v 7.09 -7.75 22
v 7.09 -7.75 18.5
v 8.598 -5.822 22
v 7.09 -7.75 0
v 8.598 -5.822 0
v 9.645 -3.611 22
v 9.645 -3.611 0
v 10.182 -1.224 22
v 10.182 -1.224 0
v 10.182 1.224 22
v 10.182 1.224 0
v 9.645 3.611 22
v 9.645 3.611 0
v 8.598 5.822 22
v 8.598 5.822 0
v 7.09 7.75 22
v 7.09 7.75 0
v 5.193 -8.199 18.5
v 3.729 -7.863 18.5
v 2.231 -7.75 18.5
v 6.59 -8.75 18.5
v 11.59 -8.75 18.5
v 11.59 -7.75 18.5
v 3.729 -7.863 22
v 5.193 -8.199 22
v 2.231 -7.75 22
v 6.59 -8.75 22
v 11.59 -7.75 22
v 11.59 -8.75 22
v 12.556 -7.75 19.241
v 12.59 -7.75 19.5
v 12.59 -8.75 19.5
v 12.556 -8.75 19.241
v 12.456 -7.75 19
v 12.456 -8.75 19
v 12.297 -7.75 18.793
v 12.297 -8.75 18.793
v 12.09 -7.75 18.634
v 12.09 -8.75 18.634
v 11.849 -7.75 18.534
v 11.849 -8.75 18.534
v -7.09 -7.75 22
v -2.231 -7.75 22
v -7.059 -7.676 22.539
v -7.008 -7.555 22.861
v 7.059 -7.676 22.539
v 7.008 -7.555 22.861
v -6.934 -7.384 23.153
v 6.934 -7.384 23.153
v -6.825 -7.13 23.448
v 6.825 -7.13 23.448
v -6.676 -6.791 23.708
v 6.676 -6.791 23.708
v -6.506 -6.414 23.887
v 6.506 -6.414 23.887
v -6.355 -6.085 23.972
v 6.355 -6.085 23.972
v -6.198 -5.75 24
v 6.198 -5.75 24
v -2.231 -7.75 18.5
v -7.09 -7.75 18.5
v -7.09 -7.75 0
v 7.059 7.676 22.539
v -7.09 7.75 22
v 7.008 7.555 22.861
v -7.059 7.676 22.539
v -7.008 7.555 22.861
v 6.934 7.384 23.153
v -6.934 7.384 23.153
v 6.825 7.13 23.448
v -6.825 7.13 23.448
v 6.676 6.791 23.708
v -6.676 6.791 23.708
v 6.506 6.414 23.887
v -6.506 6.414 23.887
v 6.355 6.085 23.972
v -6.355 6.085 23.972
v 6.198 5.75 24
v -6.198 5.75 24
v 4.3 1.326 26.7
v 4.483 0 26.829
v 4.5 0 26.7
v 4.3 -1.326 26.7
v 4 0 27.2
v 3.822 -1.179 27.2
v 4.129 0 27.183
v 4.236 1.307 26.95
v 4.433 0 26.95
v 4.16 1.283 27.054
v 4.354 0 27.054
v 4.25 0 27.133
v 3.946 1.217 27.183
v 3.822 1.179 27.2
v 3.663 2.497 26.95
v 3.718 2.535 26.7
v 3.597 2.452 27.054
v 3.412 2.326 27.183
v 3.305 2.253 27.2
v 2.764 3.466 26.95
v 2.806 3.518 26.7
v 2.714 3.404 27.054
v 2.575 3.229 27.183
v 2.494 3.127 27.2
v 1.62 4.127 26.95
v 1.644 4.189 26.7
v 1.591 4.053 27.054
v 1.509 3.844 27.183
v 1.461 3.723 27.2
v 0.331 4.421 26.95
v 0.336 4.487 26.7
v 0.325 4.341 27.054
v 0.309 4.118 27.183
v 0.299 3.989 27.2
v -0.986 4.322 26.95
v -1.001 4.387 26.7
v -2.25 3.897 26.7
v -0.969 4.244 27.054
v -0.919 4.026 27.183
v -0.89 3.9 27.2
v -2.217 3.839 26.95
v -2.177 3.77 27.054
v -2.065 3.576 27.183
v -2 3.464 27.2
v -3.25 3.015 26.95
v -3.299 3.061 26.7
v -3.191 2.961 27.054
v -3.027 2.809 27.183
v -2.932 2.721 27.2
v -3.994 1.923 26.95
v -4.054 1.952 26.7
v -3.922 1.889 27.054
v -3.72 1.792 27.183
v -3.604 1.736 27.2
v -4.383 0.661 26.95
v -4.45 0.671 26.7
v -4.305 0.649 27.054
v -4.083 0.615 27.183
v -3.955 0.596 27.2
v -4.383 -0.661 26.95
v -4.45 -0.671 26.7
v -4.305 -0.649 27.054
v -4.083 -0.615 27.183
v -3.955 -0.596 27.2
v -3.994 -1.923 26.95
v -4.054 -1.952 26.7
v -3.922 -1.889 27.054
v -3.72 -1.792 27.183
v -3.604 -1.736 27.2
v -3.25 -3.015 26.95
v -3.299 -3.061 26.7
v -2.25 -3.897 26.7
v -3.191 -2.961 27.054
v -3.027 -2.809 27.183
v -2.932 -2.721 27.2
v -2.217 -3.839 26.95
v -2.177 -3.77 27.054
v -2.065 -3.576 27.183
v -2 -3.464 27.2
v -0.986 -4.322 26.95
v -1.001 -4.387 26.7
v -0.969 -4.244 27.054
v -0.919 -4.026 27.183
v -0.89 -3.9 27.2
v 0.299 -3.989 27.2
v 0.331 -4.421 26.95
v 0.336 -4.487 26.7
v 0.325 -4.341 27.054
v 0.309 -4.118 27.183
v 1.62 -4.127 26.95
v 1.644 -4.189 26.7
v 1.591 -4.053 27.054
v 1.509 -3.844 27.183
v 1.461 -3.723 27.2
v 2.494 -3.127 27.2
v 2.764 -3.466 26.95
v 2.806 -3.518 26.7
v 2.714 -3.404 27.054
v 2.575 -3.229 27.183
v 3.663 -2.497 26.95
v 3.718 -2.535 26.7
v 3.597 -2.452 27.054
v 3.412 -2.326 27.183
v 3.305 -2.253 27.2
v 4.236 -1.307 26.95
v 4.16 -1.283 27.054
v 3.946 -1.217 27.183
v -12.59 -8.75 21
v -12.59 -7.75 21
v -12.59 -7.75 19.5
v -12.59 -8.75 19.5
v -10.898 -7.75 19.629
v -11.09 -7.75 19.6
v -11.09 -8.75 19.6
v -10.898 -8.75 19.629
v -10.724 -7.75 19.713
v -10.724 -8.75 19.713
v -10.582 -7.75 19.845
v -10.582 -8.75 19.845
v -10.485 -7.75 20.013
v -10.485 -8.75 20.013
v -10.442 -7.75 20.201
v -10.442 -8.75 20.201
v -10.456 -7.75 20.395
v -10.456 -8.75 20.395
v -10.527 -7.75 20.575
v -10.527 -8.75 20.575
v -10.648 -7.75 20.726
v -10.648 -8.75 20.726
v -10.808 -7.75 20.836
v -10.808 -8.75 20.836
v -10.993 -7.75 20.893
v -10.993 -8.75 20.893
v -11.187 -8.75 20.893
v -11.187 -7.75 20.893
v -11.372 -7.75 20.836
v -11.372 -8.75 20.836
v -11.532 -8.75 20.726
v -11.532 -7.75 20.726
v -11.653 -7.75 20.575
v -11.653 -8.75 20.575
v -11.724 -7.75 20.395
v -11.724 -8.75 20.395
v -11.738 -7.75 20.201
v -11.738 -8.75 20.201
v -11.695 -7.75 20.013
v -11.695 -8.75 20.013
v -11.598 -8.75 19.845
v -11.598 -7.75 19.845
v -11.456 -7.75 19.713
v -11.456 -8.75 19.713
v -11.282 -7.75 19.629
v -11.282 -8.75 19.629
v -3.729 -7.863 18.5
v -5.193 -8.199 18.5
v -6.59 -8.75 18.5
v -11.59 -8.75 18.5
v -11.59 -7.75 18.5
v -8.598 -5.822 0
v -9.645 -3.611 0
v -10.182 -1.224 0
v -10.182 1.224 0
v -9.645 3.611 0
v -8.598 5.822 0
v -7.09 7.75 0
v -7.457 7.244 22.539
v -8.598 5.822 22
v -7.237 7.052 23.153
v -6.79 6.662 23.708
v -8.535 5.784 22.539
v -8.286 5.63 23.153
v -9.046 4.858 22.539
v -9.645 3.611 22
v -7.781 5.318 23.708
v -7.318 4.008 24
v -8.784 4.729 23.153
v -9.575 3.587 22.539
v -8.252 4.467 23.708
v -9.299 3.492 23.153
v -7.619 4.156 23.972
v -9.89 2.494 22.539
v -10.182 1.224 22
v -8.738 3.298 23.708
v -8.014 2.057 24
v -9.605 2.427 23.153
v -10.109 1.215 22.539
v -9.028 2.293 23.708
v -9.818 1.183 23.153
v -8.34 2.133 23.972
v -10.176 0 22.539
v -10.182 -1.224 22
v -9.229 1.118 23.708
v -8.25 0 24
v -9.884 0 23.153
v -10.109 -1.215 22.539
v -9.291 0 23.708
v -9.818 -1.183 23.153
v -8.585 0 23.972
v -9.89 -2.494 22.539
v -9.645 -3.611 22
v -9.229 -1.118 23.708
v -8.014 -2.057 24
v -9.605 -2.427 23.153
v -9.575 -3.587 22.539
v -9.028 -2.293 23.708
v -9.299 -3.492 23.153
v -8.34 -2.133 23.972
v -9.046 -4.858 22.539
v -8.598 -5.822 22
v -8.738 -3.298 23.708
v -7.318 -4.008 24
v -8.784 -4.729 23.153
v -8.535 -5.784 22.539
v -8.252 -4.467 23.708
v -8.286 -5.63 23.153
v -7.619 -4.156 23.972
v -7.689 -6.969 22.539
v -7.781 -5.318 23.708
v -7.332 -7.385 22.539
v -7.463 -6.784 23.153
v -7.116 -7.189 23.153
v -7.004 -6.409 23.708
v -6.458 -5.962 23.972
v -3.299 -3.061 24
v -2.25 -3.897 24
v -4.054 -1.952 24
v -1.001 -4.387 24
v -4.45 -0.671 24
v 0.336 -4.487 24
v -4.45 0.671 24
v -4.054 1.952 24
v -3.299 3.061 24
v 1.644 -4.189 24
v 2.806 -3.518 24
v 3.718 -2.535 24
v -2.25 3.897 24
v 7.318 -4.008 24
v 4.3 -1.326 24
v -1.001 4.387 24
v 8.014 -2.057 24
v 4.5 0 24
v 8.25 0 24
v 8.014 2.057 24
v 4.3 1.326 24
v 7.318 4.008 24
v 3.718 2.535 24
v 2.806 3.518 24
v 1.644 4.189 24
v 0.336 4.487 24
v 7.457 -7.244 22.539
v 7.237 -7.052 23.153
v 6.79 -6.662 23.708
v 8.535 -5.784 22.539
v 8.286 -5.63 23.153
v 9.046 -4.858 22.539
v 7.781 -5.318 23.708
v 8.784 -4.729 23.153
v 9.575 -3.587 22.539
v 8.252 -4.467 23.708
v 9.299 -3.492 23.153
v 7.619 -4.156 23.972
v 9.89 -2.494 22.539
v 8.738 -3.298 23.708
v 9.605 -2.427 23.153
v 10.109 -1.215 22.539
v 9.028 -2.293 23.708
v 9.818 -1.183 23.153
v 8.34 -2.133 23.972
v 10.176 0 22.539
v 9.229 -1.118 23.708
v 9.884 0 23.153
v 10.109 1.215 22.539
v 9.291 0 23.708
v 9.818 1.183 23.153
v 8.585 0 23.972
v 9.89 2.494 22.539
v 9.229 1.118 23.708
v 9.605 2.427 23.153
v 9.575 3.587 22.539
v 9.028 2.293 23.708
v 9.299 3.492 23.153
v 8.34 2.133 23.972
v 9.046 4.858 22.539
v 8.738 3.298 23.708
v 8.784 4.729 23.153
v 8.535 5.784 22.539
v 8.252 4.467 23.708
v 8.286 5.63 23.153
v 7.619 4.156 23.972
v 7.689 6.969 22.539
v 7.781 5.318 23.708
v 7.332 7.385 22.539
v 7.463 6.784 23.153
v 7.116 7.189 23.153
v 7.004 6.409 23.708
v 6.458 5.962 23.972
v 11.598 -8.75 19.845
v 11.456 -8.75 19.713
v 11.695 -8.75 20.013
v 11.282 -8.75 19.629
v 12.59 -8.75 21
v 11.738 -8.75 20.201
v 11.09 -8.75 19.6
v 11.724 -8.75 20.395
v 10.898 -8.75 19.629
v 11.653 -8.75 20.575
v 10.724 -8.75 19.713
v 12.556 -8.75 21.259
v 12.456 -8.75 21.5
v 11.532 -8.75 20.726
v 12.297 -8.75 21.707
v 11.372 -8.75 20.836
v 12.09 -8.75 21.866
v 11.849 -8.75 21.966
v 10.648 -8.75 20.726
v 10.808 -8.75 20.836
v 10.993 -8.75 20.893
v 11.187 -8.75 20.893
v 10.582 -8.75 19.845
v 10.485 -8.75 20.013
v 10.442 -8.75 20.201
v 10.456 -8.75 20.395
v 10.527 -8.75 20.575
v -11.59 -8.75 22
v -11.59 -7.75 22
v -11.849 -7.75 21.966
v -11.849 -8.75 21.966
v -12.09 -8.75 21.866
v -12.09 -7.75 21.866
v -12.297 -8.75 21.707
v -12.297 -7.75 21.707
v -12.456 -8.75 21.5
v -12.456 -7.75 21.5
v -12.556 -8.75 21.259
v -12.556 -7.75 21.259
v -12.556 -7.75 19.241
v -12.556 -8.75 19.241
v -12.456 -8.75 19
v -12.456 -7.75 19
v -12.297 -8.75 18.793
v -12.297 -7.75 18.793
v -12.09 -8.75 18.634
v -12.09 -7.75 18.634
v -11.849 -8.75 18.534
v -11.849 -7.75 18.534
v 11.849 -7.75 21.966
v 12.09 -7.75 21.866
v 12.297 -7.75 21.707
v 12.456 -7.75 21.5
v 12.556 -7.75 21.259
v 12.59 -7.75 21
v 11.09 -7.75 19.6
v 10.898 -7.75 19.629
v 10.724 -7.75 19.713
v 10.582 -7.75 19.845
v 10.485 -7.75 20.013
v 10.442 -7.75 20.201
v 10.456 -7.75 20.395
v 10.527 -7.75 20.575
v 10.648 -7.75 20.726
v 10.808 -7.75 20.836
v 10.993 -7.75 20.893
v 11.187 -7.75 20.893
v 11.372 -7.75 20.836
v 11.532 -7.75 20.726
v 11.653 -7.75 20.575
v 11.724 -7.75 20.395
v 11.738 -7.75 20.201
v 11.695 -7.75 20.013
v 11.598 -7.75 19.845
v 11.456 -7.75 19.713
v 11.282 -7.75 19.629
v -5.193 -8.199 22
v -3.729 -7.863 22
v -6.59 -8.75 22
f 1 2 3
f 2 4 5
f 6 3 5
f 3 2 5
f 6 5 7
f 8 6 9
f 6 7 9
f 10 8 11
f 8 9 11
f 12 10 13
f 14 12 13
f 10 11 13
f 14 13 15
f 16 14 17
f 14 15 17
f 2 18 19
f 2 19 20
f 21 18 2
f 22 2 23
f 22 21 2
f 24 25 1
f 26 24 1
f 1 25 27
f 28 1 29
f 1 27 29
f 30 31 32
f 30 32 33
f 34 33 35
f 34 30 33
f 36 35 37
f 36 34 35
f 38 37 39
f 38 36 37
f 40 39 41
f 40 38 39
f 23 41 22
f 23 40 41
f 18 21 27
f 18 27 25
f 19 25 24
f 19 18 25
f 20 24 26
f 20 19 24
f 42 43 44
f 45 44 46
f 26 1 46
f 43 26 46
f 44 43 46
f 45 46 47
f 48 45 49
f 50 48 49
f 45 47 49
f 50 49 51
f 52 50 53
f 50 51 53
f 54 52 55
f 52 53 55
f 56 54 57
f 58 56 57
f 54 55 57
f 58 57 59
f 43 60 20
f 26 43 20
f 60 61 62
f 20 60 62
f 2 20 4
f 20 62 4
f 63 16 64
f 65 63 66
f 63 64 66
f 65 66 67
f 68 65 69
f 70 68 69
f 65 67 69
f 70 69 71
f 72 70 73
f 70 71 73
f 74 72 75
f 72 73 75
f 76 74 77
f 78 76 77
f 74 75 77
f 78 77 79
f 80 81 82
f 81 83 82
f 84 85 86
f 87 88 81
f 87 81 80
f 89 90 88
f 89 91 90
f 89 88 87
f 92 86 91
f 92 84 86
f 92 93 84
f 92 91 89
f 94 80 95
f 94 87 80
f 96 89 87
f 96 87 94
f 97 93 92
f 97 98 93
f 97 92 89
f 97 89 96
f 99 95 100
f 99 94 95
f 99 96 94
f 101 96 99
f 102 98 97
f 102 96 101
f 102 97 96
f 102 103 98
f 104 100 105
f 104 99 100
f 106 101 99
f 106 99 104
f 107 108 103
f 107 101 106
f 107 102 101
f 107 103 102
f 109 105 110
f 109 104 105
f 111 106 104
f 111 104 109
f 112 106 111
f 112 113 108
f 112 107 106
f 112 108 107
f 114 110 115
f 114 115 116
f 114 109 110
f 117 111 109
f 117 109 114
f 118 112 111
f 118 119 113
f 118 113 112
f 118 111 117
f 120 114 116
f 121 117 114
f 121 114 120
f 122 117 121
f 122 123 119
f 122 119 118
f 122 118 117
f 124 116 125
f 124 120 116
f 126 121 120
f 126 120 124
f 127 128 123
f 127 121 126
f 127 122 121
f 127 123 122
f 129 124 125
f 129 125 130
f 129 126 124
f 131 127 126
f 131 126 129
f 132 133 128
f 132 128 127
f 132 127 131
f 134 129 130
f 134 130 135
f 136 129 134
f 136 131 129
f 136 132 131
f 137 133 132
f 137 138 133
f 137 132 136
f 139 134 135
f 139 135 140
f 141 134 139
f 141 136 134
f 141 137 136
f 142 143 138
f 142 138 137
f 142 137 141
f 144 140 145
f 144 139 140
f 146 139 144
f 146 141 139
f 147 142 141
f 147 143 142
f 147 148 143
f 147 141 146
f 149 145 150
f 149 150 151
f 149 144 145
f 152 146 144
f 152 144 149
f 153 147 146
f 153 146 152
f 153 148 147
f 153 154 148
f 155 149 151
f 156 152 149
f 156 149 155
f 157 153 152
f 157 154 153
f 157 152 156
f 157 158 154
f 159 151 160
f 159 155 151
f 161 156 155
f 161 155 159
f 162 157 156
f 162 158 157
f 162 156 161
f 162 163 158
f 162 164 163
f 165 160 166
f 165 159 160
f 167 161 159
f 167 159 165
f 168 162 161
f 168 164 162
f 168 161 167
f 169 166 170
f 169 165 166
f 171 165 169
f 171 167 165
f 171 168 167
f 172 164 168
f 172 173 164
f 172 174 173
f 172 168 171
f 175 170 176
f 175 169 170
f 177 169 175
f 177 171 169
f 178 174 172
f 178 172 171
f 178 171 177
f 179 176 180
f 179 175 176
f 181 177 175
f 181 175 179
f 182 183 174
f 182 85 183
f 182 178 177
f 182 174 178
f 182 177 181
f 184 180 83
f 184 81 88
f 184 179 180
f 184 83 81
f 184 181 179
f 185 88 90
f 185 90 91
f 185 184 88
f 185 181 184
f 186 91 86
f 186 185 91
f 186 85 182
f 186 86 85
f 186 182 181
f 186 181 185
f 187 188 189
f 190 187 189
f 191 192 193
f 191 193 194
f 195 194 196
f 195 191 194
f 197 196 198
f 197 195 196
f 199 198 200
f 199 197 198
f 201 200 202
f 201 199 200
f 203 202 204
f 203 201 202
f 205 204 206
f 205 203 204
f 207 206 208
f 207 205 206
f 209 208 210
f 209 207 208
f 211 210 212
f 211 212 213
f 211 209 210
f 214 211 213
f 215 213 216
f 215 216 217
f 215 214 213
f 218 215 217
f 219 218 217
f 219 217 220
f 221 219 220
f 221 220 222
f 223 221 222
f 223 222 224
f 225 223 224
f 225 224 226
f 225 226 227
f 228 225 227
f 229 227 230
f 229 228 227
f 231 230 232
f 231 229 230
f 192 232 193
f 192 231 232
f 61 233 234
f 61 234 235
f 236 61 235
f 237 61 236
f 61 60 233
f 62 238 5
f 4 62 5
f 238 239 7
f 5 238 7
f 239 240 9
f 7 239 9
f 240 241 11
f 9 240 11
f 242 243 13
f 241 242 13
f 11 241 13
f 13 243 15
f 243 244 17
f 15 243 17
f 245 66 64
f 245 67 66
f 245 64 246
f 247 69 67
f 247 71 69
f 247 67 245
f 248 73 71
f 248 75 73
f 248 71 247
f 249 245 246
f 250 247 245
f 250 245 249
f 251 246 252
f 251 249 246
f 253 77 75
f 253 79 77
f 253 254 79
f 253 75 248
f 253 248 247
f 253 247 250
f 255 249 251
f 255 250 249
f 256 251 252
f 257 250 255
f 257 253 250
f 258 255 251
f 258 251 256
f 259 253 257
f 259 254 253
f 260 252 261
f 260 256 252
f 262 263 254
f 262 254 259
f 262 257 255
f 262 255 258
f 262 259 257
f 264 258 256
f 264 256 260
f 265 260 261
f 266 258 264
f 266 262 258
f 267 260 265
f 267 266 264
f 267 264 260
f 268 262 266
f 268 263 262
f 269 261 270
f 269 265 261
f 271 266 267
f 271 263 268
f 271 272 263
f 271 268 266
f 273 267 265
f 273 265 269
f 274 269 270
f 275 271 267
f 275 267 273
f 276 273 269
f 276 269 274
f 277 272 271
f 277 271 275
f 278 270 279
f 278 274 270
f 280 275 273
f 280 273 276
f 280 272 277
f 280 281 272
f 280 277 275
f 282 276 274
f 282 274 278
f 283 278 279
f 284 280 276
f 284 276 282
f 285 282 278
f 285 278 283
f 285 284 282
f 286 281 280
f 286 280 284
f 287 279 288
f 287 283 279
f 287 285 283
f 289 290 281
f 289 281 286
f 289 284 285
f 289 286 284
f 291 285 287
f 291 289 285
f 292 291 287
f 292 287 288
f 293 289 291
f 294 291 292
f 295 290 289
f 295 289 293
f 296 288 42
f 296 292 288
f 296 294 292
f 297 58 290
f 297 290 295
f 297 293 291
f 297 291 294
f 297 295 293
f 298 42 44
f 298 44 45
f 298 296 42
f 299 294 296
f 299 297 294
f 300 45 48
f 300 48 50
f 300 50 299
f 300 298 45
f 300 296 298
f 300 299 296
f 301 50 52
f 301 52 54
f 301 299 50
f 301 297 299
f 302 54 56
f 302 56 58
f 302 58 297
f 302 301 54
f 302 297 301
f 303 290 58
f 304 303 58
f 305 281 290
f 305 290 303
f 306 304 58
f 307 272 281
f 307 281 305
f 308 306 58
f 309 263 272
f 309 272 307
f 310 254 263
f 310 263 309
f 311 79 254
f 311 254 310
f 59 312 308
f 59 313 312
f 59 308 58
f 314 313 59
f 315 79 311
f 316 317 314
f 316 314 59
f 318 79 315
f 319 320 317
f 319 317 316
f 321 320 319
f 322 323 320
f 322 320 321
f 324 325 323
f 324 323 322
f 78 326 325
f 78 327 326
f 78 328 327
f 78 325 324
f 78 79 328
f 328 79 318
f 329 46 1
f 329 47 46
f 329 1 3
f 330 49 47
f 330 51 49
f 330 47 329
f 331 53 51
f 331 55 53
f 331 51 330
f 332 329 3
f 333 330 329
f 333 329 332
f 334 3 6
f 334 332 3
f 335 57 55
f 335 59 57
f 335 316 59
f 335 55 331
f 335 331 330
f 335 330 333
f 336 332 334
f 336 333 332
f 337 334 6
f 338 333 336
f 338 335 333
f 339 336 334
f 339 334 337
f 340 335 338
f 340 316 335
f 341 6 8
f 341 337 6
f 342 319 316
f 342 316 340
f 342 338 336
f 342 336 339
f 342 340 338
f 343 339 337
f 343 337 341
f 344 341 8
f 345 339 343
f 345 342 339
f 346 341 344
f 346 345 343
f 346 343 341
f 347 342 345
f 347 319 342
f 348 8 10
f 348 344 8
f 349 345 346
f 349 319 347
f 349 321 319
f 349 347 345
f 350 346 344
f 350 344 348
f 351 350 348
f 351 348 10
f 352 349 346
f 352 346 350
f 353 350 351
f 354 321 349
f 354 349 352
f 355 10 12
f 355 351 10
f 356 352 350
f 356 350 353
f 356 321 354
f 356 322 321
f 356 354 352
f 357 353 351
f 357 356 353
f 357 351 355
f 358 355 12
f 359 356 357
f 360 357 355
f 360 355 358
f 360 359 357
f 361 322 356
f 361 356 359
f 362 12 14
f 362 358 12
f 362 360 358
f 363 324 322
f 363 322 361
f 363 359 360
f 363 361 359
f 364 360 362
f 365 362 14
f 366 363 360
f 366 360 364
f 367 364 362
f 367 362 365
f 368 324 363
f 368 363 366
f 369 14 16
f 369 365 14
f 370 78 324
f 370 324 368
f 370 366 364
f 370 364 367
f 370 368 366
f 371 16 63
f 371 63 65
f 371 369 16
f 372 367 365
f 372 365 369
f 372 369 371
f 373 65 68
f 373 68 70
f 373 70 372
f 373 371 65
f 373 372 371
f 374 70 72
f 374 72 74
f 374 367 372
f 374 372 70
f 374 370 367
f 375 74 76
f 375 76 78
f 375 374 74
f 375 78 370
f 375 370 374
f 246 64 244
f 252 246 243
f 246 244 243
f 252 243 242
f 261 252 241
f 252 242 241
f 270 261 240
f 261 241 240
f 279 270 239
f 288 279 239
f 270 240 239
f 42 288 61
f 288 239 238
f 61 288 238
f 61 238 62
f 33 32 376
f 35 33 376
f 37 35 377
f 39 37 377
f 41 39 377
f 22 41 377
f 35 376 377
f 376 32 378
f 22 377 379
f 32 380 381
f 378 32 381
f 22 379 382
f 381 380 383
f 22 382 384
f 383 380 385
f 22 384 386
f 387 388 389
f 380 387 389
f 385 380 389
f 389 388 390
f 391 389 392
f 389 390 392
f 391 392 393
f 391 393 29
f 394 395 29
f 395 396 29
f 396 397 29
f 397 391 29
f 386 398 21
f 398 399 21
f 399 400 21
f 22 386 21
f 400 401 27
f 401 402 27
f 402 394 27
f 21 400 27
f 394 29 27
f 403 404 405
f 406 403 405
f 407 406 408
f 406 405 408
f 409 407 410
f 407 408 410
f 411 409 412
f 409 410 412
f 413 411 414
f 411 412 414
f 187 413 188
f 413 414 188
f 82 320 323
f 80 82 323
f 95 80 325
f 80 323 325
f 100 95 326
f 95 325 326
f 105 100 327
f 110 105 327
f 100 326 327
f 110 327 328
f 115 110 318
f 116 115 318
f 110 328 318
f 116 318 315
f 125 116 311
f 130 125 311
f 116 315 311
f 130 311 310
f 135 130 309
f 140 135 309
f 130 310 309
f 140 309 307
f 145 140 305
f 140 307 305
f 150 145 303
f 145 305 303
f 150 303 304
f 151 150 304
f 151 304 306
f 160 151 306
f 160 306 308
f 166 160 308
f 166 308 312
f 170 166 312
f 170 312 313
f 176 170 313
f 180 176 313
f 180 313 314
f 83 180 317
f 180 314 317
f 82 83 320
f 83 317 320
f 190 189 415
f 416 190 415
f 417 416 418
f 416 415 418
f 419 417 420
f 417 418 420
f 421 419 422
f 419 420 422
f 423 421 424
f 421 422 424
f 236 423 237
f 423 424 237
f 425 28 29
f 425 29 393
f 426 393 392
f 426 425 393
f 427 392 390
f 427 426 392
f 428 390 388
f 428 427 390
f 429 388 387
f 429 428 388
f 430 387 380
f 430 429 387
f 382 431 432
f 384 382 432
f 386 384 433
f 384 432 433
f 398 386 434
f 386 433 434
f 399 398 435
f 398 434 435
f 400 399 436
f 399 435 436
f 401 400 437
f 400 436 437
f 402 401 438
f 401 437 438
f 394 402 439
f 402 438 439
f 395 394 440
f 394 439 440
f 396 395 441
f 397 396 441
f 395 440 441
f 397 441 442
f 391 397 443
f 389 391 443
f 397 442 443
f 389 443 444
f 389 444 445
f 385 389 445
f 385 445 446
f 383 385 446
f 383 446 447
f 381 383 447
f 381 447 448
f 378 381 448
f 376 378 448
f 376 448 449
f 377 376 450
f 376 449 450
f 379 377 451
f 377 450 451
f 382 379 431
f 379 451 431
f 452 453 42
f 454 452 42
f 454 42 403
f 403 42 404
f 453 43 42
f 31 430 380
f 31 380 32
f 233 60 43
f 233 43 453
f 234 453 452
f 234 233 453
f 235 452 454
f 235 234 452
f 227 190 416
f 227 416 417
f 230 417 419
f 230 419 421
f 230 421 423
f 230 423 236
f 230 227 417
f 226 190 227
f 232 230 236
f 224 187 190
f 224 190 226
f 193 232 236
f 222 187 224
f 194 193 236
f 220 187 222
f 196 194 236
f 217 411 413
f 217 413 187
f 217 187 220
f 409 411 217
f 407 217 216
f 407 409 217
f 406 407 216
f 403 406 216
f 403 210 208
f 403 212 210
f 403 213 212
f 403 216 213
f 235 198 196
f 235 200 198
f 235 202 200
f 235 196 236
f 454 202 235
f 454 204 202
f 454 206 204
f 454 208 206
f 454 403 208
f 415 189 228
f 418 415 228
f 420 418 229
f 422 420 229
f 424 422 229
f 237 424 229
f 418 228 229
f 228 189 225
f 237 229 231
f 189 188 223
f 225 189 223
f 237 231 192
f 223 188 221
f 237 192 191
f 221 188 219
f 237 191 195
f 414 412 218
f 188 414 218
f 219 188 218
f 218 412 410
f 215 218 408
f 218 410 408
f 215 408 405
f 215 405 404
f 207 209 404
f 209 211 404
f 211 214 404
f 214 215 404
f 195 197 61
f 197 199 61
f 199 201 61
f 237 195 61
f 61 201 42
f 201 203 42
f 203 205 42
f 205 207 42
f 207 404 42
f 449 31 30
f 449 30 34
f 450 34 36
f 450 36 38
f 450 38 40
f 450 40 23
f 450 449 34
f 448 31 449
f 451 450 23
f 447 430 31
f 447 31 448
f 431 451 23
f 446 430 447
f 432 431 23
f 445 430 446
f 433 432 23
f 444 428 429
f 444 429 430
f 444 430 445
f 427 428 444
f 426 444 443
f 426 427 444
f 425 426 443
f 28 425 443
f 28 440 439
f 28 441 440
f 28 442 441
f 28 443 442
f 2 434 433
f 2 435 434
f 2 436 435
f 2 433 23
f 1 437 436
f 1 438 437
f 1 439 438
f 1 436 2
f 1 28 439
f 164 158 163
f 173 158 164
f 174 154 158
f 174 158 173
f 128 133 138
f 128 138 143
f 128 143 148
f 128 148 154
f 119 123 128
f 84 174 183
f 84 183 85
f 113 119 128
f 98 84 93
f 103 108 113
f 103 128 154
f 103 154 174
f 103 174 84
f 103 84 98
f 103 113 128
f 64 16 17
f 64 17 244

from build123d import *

# Parameters (mm, degrees)
SALIENTE_EXTRUIR1_DEPTH  = 24
REDONDEO1_R              = 2
CROQUIS2_R               = 4.5
SALIENTE_EXTRUIR2_DEPTH  = 3.2
REDONDEO2_R              = 0.5
CROQUIS3_R               = 0.65
SALIENTE_EXTRUIR3_DEPTH  = 1
REDONDEO3_R              = 10
REDONDEO3_OF_SIMETR_A1_R = 10


with BuildPart() as part:
    # Croquis1 → Saliente-Extruir1 (new body)
    with BuildSketch(Plane.XY):
        with BuildLine():
            Line((7.09, 7.75), (-7.09, 7.75))
            ThreePointArc((-7.09, 7.75), (-10.25, 0), (-7.09, -7.75))
            Line((-7.09, -7.75), (7.09, -7.75))
            ThreePointArc((7.09, -7.75), (10.25, 0), (7.09, 7.75))
        make_face()
    extrude(amount=SALIENTE_EXTRUIR1_DEPTH)

    # Redondeo1
    redondeo1_edges = [part.edges().sort_by_distance(p)[0] for p in [
        (10.25, 0, 24),
        (0, 7.75, 24),
        (-10.25, 0, 24),
        (0, -7.75, 24),
    ]]
    fillet(redondeo1_edges, radius=REDONDEO1_R)

    # Croquis2 → Saliente-Extruir2 (add)
    with BuildSketch(Plane.XY.offset(24)):
        Circle(CROQUIS2_R)
    extrude(amount=SALIENTE_EXTRUIR2_DEPTH)

    # Redondeo2
    redondeo2_edges = [part.edges().sort_by_distance(p)[0] for p in [
        (-4.5, 0, 27.2),
    ]]
    fillet(redondeo2_edges, radius=REDONDEO2_R)

    # Croquis3 → Saliente-Extruir3 (add)
    with BuildSketch(Plane.XZ.offset(7.75)):
        with BuildLine():
            Line((-6.59, 22), (-11.59, 22))
            ThreePointArc((-11.59, 22), (-12.297106781, 21.707106781), (-12.59, 21))
            Line((-12.59, 21), (-12.59, 19.5))
            ThreePointArc((-12.59, 19.5), (-12.297106781, 18.792893219), (-11.59, 18.5))
            Line((-11.59, 18.5), (-6.59, 18.5))
            Line((-6.59, 18.5), (-6.59, 22))
        make_face()
        with Locations(Location((-11.09, 20.25, 0), (0, 0, 270))):
            Circle(CROQUIS3_R, mode=Mode.SUBTRACT)
    saliente_extruir3 = extrude(amount=SALIENTE_EXTRUIR3_DEPTH)

    # Redondeo3
    # the kernel refuses this fillet: 10 mm, written as the material it adds along each edge
    with BuildSketch(Plane(origin=(-6.59, -7.75, 18.5), x_dir=(1, 0, 0), z_dir=(0, 0, 1))) as redondeo3_piece_1:
        with BuildLine():
            CenterArc((4.358898944, -10), REDONDEO3_R, 90, 25.841932763)
            Line((0, -1), (-0.087177979, -0.82))
            ThreePointArc((-0.087177979, -0.82), (-0.2, -0.5), (-0.2, 0))
            Line((-0.2, 0), (0, 0.2))
            Line((0, 0.2), (4.358898944, 0.2))
            Line((4.358898944, 0.2), (4.358898944, 0))
        make_face()
    extrude(amount=3.5)

    # Simetría1: Saliente-Extruir3 across plane
    add(saliente_extruir3.mirror(Plane(origin=(0, 0, 0), x_dir=(0, 0, 1), z_dir=(1, 0, 0))))

    # Redondeo3 of Simetría1
    # the kernel refuses this fillet: 10 mm, written as the material it adds along each edge
    with BuildSketch(Plane(origin=(6.59, -7.75, 18.5), x_dir=(-1, 0, 0), z_dir=(0, 0, 1))) as redondeo3_of_simetr_a1_piece_1:
        with BuildLine():
            CenterArc((4.358898944, 10), REDONDEO3_OF_SIMETR_A1_R, 244.158067237, 25.841932763)
            Line((0, 1), (-0.087177979, 0.82))
            ThreePointArc((-0.087177979, 0.82), (-0.2, 0.5), (-0.2, 0))
            Line((-0.2, 0), (0, -0.2))
            Line((0, -0.2), (4.358898944, -0.2))
            Line((4.358898944, -0.2), (4.358898944, 0))
        make_face()
    extrude(amount=3.5)


solid = part.part
